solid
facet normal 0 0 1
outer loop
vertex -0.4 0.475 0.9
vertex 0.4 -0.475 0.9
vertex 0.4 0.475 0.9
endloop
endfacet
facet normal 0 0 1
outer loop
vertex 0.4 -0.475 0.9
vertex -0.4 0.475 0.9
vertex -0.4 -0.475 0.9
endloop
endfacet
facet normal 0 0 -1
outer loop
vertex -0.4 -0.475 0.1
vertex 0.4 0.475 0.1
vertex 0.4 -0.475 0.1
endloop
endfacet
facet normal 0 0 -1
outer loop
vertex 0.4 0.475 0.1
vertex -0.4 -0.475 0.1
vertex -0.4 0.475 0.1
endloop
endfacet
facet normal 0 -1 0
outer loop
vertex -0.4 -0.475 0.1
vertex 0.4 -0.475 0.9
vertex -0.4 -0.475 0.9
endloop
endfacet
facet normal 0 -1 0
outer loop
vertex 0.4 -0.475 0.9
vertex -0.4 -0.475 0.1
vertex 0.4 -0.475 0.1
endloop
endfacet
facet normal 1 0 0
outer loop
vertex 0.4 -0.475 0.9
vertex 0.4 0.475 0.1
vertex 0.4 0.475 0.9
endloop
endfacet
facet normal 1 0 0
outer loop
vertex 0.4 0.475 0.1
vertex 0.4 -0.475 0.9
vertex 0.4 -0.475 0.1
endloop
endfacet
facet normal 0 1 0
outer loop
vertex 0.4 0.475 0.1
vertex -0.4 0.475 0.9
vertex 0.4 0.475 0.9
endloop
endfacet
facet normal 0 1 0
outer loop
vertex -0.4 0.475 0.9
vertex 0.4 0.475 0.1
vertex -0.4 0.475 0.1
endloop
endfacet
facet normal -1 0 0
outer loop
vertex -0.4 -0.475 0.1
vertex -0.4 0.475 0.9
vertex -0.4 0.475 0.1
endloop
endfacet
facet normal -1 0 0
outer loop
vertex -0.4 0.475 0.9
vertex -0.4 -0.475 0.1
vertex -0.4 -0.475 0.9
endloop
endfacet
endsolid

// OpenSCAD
use <lib.scad>

module chassisHD() {
	translate([0,0,0.5]) difference() {
		rbox([0.98,0.98,1.0], 0.02, $fn=8);
		translate([0,0.5,0]) box([0.8,0.1,0.8]);
		translate([0,-0.5,0]) box([0.8,0.1,0.8]);
		for (i = [-2:1:2]) translate([0.5,0,i*0.18]) rotate([0,45,0]) box([0.3,0.8,0.06]);
		for (i = [-2:1:2]) translate([-0.5,0,i*0.18]) rotate([0,-45,0]) box([0.3,0.8,0.06]);
	}
}

//chassisHD();

module insetHD() {
	translate([0,0,0.5]) difference() {
		box([0.8,0.95,0.8]);
	}
}

insetHD();

module chassisLD() {
	translate([0,0,0.5]) difference() {
		box([0.98,0.98,1.0]);
		translate([0,0.5,0]) box([0.8,0.1,0.8]);
		translate([0,-0.5,0]) box([0.8,0.1,0.8]);
		for (i = [-2:2:2]) translate([0.5,0,i*0.15]) rotate([0,45,0]) box([0.2,0.8,0.12]);
		for (i = [-2:2:2]) translate([-0.5,0,i*0.15]) rotate([0,-45,0]) box([0.2,0.8,0.12]);
	}
}

//chassisLD();

module chassisVLD() {
	translate([0,0,0.5]) difference() {
		box([0.98,0.98,1.0]);
	}
}

//chassisVLD();
